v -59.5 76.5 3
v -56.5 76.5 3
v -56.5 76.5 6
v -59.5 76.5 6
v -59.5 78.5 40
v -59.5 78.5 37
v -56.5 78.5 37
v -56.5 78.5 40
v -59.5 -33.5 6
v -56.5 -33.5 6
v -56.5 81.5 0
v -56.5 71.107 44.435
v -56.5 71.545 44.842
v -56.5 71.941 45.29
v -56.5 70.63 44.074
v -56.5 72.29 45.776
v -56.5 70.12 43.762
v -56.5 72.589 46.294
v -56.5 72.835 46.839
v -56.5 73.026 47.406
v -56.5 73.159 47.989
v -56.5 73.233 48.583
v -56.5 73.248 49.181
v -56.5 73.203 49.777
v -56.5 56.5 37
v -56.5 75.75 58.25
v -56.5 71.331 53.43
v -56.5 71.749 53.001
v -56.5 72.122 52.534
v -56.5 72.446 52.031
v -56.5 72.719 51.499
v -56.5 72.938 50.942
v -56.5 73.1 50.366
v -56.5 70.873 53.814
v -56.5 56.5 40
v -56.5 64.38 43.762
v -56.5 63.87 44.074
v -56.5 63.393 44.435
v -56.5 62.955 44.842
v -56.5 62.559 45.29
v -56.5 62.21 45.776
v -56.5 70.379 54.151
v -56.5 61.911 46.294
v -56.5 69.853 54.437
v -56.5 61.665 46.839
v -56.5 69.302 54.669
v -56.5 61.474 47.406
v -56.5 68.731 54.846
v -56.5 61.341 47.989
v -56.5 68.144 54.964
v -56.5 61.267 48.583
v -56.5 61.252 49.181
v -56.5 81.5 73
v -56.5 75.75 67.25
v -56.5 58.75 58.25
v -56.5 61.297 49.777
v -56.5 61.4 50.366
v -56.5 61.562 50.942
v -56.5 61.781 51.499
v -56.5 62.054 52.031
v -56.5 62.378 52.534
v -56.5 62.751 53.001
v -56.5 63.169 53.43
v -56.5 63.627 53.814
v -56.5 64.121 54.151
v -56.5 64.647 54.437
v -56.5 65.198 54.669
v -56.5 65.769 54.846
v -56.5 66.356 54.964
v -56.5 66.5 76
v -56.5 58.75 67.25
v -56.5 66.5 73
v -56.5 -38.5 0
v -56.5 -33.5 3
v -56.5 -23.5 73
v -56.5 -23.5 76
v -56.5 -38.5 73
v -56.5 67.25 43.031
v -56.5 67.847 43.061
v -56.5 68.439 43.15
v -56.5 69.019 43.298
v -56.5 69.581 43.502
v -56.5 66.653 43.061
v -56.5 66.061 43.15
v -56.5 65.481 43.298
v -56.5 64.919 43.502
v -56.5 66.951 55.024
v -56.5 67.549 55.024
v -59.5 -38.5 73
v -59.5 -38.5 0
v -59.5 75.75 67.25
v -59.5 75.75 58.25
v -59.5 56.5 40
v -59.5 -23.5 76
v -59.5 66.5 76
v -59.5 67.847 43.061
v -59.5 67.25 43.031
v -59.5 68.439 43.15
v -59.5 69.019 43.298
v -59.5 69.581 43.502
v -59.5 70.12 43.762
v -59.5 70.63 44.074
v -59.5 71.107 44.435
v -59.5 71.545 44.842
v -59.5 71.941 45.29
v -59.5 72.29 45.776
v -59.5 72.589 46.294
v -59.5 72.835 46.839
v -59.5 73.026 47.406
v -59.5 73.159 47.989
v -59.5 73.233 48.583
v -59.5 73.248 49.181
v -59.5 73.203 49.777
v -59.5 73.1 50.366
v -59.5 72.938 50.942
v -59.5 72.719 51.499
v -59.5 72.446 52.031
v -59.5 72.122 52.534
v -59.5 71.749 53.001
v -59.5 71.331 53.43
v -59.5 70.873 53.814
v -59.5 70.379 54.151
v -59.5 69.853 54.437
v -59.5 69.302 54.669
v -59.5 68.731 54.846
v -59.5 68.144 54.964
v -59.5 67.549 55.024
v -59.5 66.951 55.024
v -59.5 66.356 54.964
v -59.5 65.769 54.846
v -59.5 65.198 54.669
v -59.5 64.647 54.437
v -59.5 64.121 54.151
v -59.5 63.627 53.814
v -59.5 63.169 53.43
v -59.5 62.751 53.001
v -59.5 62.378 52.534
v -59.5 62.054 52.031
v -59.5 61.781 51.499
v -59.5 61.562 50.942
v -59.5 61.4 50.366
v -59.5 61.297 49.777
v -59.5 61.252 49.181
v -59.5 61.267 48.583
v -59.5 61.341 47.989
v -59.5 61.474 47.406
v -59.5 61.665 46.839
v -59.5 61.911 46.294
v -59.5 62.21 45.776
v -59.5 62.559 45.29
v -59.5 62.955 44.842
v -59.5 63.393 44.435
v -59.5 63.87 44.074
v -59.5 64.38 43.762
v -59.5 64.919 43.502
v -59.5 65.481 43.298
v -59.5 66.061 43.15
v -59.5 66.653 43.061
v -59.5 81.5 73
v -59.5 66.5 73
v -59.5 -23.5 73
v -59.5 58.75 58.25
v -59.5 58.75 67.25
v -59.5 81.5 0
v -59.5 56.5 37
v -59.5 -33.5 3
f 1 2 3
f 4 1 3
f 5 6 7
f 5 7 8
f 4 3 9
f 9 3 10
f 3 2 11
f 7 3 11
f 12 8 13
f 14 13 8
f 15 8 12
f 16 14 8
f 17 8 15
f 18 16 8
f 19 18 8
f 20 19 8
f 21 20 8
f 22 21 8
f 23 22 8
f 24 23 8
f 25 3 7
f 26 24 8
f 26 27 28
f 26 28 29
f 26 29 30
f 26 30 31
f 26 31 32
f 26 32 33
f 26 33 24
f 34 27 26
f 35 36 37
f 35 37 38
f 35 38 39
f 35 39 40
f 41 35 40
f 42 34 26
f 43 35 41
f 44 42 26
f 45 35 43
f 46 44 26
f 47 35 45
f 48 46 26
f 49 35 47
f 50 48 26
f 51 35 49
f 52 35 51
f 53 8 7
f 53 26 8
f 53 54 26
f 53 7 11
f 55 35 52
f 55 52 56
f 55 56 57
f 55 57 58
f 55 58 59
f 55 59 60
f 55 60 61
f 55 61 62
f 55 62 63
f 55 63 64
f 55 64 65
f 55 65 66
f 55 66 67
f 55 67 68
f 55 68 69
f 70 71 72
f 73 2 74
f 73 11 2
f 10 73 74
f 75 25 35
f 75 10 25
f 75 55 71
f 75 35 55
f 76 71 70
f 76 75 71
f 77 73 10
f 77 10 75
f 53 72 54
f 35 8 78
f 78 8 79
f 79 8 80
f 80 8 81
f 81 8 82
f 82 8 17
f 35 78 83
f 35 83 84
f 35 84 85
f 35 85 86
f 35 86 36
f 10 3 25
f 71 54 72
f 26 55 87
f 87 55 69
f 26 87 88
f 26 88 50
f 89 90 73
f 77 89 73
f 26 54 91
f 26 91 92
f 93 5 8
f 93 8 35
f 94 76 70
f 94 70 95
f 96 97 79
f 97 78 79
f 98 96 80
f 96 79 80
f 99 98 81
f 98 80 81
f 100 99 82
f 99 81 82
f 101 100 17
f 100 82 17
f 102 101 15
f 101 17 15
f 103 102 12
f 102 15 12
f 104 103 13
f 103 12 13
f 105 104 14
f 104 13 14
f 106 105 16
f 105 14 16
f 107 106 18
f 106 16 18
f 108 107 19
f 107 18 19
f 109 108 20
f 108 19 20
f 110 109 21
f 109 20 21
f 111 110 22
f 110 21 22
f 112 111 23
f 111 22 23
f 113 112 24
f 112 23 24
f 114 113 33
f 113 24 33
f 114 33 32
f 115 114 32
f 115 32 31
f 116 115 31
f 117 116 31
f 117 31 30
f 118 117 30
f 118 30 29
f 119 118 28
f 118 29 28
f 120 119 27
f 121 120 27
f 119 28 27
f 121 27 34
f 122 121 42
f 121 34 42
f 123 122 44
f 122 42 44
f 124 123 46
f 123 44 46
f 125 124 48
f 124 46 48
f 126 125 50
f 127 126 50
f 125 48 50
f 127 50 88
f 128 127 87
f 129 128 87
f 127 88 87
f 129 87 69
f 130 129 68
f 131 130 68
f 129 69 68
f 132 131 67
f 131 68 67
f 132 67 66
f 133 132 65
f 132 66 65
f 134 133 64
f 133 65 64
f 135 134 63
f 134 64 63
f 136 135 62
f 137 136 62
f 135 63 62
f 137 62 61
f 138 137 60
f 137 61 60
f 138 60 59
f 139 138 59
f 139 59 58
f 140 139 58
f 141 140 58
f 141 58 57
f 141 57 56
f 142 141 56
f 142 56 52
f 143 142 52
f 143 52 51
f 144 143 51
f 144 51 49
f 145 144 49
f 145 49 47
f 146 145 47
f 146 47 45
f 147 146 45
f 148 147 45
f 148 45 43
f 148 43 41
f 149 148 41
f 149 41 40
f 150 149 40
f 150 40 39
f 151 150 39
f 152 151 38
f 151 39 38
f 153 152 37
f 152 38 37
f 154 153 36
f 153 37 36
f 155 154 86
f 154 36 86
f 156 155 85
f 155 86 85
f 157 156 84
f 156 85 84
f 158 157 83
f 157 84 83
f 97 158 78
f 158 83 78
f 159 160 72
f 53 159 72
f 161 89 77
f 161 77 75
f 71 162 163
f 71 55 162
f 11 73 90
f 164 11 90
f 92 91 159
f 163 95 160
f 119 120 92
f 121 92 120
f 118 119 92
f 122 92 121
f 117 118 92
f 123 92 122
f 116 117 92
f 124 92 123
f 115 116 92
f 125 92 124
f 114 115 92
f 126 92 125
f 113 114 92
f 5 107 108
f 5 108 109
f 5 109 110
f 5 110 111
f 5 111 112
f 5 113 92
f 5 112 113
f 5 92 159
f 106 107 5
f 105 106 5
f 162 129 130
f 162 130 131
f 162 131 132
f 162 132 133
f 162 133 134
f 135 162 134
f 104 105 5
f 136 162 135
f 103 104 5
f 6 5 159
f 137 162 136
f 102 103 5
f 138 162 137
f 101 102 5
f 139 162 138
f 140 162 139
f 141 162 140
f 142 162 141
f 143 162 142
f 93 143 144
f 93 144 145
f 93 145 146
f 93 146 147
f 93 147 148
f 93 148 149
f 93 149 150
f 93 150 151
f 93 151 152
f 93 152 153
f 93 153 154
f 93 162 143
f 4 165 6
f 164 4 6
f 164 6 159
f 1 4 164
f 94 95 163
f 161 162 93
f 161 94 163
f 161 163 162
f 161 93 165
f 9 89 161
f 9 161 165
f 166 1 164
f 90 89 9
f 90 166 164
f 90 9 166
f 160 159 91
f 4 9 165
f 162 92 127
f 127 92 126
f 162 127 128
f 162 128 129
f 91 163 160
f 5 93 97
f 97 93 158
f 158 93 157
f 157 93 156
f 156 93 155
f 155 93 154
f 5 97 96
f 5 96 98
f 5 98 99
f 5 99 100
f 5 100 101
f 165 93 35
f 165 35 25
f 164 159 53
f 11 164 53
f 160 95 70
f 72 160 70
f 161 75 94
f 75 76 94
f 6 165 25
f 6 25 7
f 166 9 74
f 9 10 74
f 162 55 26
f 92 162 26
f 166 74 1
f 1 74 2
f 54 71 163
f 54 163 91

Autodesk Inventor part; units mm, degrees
ref_plane "YZ Plane" through (0, 0, 0) normal (1, 0, 0) x (0, 1, 0)
ref_plane "XZ Plane" through (0, 0, 0) normal (0, 1, 0) x (-1, 0, 0)
ref_plane "XY Plane" through (0, 0, 0) normal (0, 0, 1) x (1, 0, 0)
sketch "Sketch1" plane through (0, 0, 0) normal (0, 0, 1) x (1, 0, 0)
  line L0 (-56.5, -25) -> (-59.5, -25) projected
  line L1 (-59.5, -25) -> (-59.5, 65) projected
  line L2 (-56.5, -38) -> (-56.5, 78) projected
  line L3 (-59.5, 65) -> (-56.5, 65) projected
  line L4 (-56.5, -25) -> (-59.5, -25)
  line L5 (-59.5, -25) -> (-59.5, 65)
  line L6 (-59.5, 65) -> (-56.5, 65)
  line L7 (-56.5, 65) -> (-56.5, -25)
  point P0 (0, 0)
extrude "Extrusion1" add sketch "Sketch1" along normal blind 76
sketch "Sketch2" plane through (-59.5, -25, 0) normal (0, -1, 0) x (1, 0, 0)
  line L0 (3, 0) -> (3, 76) projected
  line L1 (0, 76) -> (3, 76) projected
  line L2 (3, 0) -> (0, 0)
  line L3 (0, 0) -> (0, 76)
  line L4 (0, 76) -> (3, 76)
  line L5 (3, 76) -> (3, 0)
  point P0 (59.5, 0)
extrude "Extrusion2" add sketch "Sketch2" along normal blind 13.5
sketch "Sketch4" plane through (-59.5, 65, 0) normal (0, 1, 0) x (1, 0, 0)
  line L0 (3, 0) -> (3, -76) projected
  line L1 (3, 0) -> (0, 0) projected
  line L2 (3, -76) -> (0, -76)
  line L3 (0, -76) -> (0, 0)
  line L4 (0, 0) -> (3, 0)
  line L5 (3, 0) -> (3, -76)
  point P0 (59.5, 0)
extrude "Extrusion3" add sketch "Sketch4" along normal blind 16.5
sketch "Sketch5" plane through (-59.5, -38.5, 0) normal (-1, 0, 0) x (0, 0, 1)
  line L0 (0, 120) -> (76, 120) projected
  line L1 (76, 120) -> (73, 120)
  line L2 (73, 120) -> (73, 110)
  line L3 (73, 110) -> (76, 110)
  line L4 (76, 110) -> (76, 120)
  line L5 (76, 0) -> (76, 120) projected
  line L6 (76, 0) -> (73, 0)
  line L7 (73, 0) -> (73, 10)
  line L8 (73, 10) -> (76, 10)
  line L9 (76, 10) -> (76, 0)
  point P0 (0, 38.5)
  dimension "d10" = 3
  dimension "d11" = 10
  dimension "d12" = 3
  dimension "d13" = 10
extrude "Extrusion4" cut sketch "Sketch5" against normal blind 10
sketch "Sketch6" plane through (0, 0, 76) normal (0, 0, 1) x (1, 0, 0)
  line L0 (-59.5, -28.5) -> (-56.5, -28.5) projected
  line L1 (-56.5, -28.5) -> (-56.5, -38.5) projected
  line L2 (-59.5, -38.5) -> (-59.5, -28.5) projected
  line L3 (-56.5, -23.5) -> (-59.5, -23.5) projected
  line L4 (-59.5, 66.5) -> (-56.5, 66.5) projected
  line L5 (-59.5, 81.5) -> (-59.5, -38.5) projected
  line L6 (-56.5, -23.5) -> (-59.5, -23.5)
  line L7 (-59.5, -23.5) -> (-59.5, -38.5)
  line L8 (-59.5, -38.5) -> (-56.5, -38.5)
  line L9 (-56.5, -38.5) -> (-56.5, -23.5)
  line L10 (-56.5, 66.5) -> (-59.5, 66.5)
  line L11 (-59.5, 66.5) -> (-59.5, 81.5)
  line L12 (-59.5, 81.5) -> (-56.5, 81.5)
  line L13 (-56.5, 81.5) -> (-56.5, 66.5)
  point P0 (0, 0)
  dimension "d16" = 15
extrude "Extrusion5" cut sketch "Sketch6" against normal blind 3
sketch "Sketch7" plane through (-56.5, -38.5, 0) normal (1, 0, 0) x (0, 0, -1)
  circle A0 centre (-58, 105) radius 5 projected
  circle A1 centre (-58, 105) radius 5 projected
  line L0 (-70, 94.5) -> (-43, 94.5)
  line L1 (-43, 94.5) -> (-43, 117.0005)
  line L2 (-43, 117.0005) -> (-70, 117.0005)
  line L3 (-70, 117.0005) -> (-70, 94.5)
  line L4 (0, 91.5) -> (-73, 91.5) projected
  line L5 (-73, 105) -> (-73, 95) projected
  line L6 (-63, 120.0005) -> (-73, 120.0005) projected
  line L7 (-40, 95) -> (-40, 117) projected
  line L8 (-58.25, 97.2505) -> (-58.25, 114.2505) projected
  line L9 (-58.25, 114.2505) -> (-58.25, 97.2505) projected
  line L10 (-58.25, 97.2505) -> (-67.25, 97.2505) projected
  line L11 (-67.25, 97.2505) -> (-67.25, 114.2505) projected
  line L12 (-67.25, 114.2505) -> (-58.25, 114.2505) projected
  line L13 (-58.25, 114.2505) -> (-67.25, 114.2505)
  line L14 (-67.25, 114.2505) -> (-67.25, 97.2505)
  line L15 (-67.25, 97.2505) -> (-58.25, 97.2505)
  line L16 (-58.25, 97.2505) -> (-58.25, 114.2505)
  circle A2 centre (-49.0313, 105.75) radius 6
  line L17 (-73, 120) -> (0, 120) projected
  point P0 (0, 38.5)
  point P1 (-58.25, 100.0063)
  point P2 (-58.25, 109.9937)
  dimension "d26" = 3
  dimension "d27" = 3
  dimension "d28" = 3
  dimension "d29" = 3
  dimension "d30" = 12
  dimension "d31" = 9
  dimension "d32" = 14.25
  dimension "d33" = 14.25
extrude "Extrusion6" cut sketch "Sketch7" against normal blind 3 contours A0 A2 | A0 A2 | L8 A0 | A0 L8 L10 L11 L12
sketch "Sketch8" plane through (-59.5, -38.5, 0) normal (-1, 0, 0) x (0, 0, 1)
  line L0 (40, 117) -> (40, 95) projected
  line L1 (37, 95) -> (37, 117) projected
  line L2 (37, 117) -> (40, 117) projected
  line L3 (37, 117) -> (40, 117)
  line L4 (40, 117) -> (40, 95)
  line L5 (40, 95) -> (37, 95)
  line L6 (37, 95) -> (37, 117)
  point P0 (0, 38.5)
  point P1 (37, 95)
extrude "Extrusion7" cut sketch "Sketch8" against normal blind 3
sketch "Sketch9" plane through (-56.5, -38.5, 0) normal (1, 0, 0) x (0, 0, -1)
  line L0 (-6, 115) -> (-6, 5) projected
  line L1 (-3, 5) -> (-3, 115) projected
  line L2 (-3, 115) -> (-6, 115) projected
  line L3 (-6, 5) -> (-3, 5) projected
  line L4 (-6, 115) -> (-3, 115)
  line L5 (-3, 115) -> (-3, 5)
  line L6 (-3, 5) -> (-6, 5)
  line L7 (-6, 5) -> (-6, 115)
  point P0 (0, 38.5)
extrude "Extrusion8" cut sketch "Sketch9" against normal blind 3
sketch "Sketch10" plane through (-56.5, -38.5, 0) normal (1, 0, 0) x (0, 0, -1)
  point P0 (0, 38.5)
properties part number "divider"
